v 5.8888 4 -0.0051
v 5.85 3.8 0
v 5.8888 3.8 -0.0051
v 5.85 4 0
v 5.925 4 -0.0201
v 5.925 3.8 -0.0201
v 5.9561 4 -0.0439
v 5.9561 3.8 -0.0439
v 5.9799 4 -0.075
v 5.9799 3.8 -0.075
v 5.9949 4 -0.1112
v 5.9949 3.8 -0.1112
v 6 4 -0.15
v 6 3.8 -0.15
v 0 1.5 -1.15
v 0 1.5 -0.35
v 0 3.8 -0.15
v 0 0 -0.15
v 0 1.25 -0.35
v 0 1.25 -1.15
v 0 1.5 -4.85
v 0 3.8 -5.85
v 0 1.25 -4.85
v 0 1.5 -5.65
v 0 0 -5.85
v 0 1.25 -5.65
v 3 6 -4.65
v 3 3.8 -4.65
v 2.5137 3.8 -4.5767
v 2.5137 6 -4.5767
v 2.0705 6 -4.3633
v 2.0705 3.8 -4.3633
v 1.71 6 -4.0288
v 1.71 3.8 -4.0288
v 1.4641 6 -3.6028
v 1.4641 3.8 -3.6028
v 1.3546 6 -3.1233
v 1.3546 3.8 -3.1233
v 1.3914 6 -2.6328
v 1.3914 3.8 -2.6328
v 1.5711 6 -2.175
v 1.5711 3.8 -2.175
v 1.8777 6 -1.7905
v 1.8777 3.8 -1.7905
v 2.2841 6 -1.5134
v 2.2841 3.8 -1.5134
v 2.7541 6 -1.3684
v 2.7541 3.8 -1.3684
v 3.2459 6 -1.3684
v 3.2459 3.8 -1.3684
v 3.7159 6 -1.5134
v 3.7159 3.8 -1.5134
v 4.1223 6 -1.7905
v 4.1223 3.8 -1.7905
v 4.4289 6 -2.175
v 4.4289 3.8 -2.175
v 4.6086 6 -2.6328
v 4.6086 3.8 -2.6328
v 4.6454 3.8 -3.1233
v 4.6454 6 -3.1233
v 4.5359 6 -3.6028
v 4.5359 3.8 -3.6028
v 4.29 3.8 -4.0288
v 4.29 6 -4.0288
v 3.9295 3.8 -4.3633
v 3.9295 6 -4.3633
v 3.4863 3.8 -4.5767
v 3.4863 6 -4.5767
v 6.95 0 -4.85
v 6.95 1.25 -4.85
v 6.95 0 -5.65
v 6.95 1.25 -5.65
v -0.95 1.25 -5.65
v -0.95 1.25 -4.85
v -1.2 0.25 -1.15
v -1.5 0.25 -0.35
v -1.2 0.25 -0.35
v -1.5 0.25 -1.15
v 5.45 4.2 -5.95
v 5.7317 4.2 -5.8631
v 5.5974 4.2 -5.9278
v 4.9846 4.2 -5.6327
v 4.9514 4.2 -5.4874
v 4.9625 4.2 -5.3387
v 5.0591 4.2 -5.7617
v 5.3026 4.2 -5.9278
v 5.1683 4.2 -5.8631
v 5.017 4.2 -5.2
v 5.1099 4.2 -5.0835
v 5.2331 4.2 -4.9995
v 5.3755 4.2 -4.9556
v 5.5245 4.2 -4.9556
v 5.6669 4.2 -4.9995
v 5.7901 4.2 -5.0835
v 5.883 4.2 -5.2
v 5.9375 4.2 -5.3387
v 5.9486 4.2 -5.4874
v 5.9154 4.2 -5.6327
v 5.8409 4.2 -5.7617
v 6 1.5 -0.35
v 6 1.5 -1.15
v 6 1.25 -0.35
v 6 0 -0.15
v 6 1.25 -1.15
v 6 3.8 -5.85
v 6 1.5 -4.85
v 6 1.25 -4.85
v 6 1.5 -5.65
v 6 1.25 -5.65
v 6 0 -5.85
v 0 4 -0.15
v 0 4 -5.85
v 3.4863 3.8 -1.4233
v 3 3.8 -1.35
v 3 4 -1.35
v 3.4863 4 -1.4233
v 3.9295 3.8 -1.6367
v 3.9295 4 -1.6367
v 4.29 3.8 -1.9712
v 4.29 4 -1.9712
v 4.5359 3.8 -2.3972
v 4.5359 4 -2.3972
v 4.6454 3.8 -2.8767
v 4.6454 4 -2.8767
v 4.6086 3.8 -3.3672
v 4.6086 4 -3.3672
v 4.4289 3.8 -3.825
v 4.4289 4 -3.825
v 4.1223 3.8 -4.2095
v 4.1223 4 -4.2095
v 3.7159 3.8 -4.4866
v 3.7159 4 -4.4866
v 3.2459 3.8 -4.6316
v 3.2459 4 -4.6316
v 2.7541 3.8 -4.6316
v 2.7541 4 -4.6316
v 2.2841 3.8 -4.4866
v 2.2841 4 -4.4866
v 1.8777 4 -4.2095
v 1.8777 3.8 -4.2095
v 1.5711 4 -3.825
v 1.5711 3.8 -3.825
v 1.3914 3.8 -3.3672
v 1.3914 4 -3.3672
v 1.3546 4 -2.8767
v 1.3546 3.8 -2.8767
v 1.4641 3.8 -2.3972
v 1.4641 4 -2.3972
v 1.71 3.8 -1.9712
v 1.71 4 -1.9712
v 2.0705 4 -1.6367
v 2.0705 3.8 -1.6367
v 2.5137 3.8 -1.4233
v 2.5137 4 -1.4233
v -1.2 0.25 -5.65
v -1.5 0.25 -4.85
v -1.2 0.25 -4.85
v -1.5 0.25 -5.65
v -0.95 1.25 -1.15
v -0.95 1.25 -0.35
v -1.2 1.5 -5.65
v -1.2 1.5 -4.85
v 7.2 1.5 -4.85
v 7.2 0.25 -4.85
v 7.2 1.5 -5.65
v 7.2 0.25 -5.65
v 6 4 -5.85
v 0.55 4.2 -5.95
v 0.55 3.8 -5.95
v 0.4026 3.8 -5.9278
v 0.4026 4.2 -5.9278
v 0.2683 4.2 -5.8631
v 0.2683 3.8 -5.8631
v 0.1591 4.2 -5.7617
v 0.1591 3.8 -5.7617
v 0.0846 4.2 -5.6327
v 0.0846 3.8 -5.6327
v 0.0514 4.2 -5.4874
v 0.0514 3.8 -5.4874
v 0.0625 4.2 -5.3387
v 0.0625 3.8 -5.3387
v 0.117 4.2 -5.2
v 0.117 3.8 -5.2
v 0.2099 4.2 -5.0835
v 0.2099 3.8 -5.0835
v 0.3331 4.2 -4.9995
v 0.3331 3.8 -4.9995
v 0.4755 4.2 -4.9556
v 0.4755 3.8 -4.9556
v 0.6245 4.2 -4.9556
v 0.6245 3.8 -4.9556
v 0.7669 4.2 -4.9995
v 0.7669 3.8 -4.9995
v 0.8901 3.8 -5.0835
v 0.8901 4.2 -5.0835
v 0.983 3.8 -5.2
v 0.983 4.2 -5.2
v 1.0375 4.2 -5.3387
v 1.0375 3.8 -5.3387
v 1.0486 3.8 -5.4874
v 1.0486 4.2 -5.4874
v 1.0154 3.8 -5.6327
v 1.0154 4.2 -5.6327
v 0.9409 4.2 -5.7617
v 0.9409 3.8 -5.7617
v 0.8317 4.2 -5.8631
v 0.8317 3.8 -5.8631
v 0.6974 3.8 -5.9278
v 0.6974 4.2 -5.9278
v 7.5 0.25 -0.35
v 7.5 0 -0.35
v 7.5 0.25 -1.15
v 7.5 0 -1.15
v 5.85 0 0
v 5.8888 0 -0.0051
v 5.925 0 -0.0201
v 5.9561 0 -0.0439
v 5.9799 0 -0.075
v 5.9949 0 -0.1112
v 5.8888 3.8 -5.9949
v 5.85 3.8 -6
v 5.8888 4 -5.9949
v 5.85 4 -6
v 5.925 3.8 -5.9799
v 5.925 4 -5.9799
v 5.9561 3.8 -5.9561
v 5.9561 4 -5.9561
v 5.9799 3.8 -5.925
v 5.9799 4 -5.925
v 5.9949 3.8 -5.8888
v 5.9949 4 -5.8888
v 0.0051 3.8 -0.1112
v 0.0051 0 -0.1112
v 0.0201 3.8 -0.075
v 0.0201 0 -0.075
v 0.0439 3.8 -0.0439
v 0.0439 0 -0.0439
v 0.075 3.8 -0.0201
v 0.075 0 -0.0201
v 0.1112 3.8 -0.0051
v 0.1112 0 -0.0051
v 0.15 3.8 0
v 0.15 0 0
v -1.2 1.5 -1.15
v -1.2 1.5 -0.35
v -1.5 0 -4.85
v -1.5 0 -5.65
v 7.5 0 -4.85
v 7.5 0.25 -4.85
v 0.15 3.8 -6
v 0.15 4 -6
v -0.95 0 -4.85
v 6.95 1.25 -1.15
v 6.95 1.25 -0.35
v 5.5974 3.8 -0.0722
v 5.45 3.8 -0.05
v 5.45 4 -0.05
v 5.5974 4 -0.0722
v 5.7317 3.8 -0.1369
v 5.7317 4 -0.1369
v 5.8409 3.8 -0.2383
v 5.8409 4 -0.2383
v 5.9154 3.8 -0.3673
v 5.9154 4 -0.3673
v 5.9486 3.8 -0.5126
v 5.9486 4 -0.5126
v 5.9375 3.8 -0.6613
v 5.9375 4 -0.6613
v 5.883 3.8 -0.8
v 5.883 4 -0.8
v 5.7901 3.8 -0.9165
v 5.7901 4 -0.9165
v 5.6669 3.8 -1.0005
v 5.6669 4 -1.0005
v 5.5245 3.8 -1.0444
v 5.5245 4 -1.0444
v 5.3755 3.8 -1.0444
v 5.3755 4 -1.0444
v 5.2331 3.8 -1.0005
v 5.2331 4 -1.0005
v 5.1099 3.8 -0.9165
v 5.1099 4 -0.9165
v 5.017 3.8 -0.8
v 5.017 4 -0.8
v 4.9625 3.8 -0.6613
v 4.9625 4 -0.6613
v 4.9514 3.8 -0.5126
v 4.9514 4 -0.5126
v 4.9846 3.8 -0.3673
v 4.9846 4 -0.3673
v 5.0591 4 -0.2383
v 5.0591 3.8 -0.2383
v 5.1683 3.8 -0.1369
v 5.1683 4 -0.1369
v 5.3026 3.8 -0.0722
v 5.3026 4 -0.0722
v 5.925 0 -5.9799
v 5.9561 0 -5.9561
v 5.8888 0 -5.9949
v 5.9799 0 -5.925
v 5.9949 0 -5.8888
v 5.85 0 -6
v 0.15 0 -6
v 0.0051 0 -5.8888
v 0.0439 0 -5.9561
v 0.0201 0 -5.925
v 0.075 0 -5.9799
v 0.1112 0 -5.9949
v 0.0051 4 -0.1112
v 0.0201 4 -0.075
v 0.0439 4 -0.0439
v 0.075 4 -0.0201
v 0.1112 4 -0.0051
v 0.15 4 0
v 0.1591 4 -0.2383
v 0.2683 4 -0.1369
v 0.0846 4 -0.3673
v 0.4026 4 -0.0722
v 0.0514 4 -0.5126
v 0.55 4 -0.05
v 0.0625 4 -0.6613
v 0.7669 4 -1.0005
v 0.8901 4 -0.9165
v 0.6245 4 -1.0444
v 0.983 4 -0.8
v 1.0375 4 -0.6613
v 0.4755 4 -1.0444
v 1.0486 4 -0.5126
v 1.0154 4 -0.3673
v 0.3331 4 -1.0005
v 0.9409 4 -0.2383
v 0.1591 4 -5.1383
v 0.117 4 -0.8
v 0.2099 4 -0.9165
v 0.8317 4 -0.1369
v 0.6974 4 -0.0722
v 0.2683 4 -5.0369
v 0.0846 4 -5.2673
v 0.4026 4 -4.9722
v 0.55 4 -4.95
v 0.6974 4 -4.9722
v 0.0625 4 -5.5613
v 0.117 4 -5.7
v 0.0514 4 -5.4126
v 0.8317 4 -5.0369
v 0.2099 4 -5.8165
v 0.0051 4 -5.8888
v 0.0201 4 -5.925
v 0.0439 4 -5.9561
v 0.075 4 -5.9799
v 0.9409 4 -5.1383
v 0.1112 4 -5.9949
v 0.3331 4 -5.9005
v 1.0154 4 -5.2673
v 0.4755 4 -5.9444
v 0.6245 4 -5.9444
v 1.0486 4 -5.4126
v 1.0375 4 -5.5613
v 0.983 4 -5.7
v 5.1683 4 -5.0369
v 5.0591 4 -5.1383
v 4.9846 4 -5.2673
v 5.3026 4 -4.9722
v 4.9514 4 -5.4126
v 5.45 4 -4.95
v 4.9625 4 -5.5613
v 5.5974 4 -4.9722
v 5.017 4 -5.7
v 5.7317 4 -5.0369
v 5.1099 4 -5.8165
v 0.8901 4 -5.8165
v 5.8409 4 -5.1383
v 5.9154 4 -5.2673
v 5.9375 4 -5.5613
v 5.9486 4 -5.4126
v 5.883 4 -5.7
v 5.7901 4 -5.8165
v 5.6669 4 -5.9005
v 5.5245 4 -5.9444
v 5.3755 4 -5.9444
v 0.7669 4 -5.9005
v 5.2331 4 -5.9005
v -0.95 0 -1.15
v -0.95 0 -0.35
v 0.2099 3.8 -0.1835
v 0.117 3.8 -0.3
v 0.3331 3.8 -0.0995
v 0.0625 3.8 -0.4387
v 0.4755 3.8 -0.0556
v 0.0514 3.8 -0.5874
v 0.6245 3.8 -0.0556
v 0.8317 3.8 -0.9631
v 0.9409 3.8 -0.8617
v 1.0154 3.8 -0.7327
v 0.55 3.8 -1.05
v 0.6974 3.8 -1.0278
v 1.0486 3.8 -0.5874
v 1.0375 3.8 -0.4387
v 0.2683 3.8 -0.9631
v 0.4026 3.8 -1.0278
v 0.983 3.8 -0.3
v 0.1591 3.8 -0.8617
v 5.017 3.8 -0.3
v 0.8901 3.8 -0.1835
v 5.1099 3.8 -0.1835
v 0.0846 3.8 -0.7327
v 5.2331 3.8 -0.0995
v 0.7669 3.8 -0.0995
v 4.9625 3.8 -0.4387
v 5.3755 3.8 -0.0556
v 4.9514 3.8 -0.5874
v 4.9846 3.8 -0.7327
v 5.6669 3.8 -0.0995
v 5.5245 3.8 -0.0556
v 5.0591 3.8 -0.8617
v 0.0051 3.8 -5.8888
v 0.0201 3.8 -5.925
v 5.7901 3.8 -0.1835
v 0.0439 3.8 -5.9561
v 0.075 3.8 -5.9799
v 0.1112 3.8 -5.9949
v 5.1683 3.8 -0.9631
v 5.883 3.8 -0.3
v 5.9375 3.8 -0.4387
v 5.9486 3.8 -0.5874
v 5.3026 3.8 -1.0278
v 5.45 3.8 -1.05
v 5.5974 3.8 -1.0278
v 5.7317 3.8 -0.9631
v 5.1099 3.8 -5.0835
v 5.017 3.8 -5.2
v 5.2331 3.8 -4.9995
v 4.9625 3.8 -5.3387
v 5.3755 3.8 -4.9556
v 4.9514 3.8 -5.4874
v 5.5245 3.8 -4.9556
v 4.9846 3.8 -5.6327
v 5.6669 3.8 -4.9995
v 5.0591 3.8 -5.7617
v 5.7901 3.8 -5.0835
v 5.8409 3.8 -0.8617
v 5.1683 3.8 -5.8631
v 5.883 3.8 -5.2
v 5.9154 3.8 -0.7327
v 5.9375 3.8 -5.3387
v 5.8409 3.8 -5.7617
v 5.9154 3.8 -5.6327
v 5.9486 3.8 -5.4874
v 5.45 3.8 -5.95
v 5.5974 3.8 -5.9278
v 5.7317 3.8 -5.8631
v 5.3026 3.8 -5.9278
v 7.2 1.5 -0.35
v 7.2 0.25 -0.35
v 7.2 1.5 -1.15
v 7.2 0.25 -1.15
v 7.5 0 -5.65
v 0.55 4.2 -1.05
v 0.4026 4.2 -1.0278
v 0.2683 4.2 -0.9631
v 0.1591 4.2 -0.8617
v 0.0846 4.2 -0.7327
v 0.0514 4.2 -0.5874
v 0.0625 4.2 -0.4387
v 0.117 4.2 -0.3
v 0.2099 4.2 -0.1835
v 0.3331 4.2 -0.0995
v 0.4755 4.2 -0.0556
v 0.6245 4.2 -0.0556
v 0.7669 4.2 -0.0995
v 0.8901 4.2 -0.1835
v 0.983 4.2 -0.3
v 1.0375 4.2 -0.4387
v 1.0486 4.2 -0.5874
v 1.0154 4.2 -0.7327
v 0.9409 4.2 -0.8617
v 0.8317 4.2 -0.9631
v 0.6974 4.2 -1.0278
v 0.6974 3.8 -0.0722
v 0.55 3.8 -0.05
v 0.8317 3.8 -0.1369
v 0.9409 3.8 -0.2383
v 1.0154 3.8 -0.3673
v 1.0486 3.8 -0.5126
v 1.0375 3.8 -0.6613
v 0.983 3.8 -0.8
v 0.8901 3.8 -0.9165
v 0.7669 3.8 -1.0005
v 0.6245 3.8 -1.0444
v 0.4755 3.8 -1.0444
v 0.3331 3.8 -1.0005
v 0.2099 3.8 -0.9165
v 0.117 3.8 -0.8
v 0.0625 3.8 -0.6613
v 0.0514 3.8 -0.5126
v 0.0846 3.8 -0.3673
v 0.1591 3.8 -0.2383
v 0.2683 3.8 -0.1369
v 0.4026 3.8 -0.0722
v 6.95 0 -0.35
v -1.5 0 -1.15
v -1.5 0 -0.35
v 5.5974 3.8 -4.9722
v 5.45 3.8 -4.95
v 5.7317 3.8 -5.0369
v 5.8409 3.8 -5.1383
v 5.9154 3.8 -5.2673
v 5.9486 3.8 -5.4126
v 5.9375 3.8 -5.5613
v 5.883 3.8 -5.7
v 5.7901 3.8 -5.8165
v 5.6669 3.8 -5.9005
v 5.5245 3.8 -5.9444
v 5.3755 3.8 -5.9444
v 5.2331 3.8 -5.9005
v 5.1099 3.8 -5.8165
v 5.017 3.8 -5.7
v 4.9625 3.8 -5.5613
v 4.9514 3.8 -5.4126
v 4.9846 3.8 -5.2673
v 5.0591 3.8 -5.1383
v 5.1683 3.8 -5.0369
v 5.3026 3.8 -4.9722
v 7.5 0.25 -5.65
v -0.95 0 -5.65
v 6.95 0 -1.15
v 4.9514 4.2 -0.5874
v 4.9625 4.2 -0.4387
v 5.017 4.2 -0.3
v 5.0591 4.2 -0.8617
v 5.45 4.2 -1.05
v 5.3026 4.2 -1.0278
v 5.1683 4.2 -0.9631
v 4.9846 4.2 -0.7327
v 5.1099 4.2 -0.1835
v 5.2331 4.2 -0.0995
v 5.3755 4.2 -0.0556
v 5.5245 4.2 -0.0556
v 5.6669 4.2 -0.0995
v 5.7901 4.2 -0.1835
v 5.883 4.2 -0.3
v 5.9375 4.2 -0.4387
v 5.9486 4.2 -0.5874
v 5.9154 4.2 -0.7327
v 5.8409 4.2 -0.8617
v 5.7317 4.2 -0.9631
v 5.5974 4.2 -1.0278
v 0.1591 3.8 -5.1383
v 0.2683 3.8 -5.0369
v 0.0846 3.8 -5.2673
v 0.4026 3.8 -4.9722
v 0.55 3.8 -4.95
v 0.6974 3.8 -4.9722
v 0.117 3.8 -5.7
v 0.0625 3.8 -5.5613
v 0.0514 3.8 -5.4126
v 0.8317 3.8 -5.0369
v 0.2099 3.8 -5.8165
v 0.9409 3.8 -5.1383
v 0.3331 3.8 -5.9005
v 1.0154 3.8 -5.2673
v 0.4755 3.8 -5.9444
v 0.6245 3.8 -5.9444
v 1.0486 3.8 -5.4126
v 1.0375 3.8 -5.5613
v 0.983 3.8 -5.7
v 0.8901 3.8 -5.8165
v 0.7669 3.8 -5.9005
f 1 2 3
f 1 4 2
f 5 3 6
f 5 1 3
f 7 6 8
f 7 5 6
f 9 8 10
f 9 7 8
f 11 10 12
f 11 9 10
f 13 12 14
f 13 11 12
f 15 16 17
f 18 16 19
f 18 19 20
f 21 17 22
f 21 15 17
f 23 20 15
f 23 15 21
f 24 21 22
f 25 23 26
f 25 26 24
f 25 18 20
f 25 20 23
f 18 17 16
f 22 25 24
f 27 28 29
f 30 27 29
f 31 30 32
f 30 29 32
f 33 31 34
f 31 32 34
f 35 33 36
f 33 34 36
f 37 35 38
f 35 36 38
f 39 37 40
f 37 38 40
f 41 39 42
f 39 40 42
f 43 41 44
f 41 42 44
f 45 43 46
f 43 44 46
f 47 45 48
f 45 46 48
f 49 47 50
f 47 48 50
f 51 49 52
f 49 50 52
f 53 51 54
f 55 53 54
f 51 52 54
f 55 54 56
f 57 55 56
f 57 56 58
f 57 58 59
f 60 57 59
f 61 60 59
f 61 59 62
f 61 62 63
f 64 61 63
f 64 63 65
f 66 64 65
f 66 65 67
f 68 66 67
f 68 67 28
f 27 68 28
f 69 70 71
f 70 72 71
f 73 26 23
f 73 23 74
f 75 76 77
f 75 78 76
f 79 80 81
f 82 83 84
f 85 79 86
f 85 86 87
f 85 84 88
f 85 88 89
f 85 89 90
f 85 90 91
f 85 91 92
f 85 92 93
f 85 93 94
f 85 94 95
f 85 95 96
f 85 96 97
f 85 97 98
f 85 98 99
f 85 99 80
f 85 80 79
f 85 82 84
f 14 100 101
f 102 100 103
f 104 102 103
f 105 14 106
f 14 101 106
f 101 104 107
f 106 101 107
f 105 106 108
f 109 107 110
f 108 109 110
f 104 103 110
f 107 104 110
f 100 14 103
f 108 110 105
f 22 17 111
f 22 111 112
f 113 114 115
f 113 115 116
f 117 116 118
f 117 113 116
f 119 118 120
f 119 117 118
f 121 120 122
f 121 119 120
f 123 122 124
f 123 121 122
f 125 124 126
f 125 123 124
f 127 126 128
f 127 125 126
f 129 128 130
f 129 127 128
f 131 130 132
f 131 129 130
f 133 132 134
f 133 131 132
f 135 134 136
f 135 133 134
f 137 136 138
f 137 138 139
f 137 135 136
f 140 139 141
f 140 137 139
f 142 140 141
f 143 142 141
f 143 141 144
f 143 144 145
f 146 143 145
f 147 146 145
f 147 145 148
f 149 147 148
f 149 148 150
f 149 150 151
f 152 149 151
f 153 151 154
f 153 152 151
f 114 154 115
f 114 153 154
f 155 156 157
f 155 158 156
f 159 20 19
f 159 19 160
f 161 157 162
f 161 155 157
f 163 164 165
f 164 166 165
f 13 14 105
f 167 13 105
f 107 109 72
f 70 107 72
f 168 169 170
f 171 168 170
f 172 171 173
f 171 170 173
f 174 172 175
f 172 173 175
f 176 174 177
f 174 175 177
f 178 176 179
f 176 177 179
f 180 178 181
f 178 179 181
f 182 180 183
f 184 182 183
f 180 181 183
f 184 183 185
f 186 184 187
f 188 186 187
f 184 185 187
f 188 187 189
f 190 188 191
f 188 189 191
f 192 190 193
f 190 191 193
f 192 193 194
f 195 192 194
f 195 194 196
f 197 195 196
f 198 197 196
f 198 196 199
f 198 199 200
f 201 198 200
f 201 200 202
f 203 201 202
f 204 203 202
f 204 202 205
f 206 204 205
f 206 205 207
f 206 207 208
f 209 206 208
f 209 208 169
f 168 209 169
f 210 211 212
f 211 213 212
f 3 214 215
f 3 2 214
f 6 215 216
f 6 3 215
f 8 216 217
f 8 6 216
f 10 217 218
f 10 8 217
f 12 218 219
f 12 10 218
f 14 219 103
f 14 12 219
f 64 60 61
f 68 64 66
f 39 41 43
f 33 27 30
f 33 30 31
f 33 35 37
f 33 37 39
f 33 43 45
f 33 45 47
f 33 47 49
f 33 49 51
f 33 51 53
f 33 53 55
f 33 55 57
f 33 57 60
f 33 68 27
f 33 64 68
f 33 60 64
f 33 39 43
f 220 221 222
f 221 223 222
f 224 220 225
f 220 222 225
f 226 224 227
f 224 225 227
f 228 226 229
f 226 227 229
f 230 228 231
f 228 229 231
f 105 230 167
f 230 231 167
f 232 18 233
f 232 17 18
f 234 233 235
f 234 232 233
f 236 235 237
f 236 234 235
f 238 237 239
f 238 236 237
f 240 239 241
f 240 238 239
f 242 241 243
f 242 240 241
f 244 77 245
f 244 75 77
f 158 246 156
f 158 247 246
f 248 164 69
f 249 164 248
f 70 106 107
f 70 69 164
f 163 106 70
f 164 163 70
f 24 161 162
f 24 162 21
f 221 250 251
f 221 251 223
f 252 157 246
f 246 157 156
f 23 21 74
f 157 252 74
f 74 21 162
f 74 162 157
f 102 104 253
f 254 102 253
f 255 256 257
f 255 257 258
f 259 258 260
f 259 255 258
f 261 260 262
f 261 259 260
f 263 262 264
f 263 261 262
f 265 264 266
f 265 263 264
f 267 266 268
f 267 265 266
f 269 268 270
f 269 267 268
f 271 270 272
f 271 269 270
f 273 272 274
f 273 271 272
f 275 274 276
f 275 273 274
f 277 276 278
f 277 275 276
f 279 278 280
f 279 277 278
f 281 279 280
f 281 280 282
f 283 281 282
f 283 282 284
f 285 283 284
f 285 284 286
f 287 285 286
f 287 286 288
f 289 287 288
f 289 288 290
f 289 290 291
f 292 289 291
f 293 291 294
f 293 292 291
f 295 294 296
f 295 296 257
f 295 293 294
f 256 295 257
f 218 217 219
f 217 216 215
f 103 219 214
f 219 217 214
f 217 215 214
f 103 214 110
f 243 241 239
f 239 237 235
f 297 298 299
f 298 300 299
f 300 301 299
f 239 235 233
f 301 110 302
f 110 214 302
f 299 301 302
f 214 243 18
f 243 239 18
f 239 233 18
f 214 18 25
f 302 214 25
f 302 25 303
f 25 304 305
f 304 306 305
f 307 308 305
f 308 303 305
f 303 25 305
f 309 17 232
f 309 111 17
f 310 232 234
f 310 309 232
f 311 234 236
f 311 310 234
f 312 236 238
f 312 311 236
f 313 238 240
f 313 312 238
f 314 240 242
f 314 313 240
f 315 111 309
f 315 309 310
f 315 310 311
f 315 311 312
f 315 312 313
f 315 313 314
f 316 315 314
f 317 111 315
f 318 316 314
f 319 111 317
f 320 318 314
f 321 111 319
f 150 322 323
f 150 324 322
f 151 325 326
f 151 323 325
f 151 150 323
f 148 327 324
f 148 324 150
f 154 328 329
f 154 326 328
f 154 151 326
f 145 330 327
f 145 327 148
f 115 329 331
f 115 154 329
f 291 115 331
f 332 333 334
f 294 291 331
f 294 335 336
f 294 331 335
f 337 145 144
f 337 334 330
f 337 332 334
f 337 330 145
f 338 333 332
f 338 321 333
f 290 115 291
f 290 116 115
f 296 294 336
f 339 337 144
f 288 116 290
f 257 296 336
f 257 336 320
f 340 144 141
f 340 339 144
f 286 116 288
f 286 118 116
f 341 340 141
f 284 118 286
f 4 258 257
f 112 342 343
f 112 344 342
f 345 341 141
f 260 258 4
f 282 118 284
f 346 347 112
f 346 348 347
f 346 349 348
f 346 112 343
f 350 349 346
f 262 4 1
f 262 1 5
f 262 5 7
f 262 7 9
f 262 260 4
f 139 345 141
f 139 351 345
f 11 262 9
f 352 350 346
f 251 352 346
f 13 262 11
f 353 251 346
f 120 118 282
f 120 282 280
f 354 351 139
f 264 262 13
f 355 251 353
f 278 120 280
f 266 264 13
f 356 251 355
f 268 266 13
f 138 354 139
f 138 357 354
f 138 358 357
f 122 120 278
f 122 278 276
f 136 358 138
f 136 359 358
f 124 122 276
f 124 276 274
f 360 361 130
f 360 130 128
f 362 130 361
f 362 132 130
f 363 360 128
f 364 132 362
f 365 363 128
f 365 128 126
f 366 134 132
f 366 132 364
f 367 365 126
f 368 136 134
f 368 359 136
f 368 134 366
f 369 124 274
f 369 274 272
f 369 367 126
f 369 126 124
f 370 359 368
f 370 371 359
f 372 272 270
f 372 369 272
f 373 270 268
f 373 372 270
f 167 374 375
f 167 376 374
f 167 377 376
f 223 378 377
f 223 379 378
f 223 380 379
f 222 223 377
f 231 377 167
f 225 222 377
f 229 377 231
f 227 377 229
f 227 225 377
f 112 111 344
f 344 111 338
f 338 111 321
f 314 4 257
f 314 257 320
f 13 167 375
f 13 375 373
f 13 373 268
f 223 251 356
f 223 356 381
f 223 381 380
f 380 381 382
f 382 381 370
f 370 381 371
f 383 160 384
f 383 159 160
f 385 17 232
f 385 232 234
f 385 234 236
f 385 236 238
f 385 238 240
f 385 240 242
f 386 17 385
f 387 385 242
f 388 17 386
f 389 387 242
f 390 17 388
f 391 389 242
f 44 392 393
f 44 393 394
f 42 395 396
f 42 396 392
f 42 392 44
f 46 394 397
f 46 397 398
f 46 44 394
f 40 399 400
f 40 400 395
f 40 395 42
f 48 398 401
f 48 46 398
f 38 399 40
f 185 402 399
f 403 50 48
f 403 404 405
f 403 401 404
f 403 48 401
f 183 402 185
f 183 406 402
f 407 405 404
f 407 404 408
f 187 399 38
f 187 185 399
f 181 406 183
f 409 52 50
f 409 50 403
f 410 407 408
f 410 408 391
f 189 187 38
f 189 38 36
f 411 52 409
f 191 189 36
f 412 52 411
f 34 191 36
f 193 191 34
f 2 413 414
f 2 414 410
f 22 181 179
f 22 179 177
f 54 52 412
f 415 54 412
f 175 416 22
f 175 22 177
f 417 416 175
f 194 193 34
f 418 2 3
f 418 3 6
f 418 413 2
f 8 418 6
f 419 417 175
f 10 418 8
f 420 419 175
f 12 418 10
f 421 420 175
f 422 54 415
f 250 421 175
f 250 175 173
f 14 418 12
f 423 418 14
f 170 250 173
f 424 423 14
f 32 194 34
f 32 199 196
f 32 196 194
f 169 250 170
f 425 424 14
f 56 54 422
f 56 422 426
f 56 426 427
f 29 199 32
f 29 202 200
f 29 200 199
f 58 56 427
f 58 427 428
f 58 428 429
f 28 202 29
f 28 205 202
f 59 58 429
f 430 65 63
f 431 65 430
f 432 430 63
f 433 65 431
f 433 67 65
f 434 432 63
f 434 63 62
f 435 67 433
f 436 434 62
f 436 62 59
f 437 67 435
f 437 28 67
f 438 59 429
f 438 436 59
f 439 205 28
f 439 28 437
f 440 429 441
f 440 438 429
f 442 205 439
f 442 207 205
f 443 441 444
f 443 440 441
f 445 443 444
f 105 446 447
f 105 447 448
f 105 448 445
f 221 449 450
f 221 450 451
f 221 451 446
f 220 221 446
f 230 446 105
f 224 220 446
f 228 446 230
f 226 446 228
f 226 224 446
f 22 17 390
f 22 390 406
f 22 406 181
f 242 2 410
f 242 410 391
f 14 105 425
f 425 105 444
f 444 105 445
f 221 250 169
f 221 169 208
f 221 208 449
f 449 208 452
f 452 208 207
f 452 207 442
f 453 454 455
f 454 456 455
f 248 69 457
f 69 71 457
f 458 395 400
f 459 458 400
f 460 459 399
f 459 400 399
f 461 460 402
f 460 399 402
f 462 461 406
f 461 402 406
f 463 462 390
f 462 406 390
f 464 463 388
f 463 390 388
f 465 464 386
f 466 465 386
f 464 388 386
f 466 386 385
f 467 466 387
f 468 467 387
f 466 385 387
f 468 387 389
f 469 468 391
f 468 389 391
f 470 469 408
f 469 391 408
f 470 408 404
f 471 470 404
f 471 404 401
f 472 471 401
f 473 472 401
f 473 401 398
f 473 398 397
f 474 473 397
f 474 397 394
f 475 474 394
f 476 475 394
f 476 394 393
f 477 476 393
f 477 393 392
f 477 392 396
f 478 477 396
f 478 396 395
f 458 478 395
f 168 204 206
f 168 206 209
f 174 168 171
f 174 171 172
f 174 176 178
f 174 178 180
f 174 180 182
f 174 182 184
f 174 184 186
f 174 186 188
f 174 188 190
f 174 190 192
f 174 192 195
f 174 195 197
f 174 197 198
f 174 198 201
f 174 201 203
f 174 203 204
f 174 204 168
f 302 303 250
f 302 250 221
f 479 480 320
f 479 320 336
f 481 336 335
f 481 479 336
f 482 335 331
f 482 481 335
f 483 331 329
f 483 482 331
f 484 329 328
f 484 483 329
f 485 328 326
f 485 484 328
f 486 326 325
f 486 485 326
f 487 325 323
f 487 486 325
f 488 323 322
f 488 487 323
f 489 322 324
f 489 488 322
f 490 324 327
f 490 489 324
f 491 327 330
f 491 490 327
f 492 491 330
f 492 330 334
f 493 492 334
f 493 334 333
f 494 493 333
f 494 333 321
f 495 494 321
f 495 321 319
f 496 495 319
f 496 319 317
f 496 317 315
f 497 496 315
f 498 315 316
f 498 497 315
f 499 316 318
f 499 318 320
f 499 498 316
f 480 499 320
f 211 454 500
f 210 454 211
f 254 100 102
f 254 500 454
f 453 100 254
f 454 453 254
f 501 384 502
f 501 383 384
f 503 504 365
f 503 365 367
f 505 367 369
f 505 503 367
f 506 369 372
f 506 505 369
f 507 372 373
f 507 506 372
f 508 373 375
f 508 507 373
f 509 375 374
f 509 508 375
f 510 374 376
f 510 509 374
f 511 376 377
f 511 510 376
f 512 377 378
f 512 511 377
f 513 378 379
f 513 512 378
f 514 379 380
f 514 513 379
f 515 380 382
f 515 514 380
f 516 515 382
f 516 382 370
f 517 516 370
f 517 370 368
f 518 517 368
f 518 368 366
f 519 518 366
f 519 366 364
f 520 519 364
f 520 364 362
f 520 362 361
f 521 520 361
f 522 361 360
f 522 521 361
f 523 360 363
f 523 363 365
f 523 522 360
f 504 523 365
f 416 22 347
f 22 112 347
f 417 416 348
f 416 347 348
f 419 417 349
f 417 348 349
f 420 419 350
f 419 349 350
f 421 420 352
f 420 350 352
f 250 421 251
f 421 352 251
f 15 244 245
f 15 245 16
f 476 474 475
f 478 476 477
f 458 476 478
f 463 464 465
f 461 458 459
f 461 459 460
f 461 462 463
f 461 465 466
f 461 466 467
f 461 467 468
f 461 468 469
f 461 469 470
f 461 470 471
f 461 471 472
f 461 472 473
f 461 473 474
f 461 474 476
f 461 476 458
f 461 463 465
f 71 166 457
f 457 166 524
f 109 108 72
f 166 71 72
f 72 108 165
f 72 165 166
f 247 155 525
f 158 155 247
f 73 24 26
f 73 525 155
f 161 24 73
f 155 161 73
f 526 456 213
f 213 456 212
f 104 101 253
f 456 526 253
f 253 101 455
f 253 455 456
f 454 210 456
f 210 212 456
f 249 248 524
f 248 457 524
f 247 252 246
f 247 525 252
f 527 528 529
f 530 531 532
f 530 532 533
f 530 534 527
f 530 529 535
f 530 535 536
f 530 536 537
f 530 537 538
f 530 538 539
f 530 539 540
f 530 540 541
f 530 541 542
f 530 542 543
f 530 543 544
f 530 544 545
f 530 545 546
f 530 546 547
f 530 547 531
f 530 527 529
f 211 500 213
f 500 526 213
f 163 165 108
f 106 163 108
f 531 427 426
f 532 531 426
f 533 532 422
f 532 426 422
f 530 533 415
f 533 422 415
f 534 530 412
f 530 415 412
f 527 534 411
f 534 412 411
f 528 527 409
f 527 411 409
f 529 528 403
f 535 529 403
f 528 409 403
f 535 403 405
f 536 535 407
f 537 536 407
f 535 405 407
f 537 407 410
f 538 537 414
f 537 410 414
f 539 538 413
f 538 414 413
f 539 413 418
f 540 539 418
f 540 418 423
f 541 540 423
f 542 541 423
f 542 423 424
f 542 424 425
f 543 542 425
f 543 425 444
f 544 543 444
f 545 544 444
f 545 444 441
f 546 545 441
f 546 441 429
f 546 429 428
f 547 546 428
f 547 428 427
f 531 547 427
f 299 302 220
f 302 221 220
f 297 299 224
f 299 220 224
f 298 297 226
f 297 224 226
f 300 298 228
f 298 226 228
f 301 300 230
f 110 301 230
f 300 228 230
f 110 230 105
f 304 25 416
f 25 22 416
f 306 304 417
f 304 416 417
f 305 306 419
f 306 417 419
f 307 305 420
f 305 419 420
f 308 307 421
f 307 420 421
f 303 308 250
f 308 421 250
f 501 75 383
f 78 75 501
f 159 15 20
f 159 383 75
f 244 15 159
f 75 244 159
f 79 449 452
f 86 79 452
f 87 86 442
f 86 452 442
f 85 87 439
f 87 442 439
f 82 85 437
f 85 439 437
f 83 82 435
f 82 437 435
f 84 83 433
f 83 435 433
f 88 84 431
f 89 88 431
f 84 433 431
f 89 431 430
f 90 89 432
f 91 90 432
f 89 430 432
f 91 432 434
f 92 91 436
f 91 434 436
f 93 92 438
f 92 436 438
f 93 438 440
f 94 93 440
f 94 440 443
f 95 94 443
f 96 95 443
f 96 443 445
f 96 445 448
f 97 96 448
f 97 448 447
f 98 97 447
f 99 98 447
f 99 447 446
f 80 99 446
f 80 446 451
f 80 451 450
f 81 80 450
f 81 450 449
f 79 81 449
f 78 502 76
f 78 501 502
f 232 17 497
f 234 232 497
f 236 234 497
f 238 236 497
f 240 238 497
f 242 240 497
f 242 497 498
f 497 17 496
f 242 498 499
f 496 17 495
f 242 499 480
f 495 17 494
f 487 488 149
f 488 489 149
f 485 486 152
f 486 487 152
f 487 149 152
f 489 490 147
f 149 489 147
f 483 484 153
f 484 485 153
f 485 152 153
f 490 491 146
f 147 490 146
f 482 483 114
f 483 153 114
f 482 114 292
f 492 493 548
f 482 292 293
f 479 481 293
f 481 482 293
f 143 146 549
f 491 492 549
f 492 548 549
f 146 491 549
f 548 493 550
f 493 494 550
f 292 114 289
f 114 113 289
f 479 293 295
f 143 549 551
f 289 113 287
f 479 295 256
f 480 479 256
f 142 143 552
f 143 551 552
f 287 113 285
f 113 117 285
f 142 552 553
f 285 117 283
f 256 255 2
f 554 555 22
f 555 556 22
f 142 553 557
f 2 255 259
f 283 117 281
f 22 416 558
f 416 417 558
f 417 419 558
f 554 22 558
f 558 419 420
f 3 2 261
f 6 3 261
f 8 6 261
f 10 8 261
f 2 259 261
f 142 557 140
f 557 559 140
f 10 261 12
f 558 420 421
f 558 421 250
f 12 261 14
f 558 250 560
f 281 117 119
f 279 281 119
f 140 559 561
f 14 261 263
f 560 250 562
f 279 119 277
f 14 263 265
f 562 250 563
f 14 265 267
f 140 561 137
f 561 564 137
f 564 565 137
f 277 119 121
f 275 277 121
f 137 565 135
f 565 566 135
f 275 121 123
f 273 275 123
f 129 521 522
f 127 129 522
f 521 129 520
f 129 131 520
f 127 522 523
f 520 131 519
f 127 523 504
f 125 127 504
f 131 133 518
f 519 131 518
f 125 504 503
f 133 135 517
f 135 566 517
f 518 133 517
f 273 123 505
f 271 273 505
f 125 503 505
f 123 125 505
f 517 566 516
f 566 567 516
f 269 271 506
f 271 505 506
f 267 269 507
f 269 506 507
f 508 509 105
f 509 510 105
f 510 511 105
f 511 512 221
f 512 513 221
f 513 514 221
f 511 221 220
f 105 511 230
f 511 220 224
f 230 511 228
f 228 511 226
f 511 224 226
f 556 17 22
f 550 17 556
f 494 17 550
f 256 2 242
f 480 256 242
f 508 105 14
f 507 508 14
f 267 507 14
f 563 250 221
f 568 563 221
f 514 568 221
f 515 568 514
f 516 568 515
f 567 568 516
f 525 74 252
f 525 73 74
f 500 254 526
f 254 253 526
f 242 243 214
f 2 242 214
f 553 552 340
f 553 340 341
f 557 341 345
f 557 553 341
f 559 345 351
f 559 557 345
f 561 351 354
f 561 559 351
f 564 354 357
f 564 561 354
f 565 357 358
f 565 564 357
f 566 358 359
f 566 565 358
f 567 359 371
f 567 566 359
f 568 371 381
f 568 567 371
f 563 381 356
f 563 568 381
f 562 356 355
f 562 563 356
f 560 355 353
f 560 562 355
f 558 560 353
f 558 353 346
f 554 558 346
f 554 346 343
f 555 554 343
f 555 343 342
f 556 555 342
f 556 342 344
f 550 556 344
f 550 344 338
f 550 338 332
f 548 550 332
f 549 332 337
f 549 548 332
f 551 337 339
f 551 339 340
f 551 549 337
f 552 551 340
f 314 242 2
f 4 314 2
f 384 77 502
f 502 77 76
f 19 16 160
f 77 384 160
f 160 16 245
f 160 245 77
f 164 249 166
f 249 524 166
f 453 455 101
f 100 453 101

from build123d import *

# Parameters (mm, degrees)
SKETCH1_W           = 6
SKETCH1_H           = 6
BOSS_EXTRUDE1_DEPTH = 3.8
SKETCH1_3_R         = 1.65
BOSS_EXTRUDE2_DEPTH = 6
SKETCH1_4_R         = 0.5
BOSS_EXTRUDE3_DEPTH = 4.2
SKETCH2_W           = 6
SKETCH2_H           = 6
SKETCH2_R           = 1.65
SKETCH2_R_2         = 0.5
BOSS_EXTRUDE4_DEPTH = 0.2
FILLET1_R           = 0.15
FILLET2_R           = 0.15
BOSS_EXTRUDE5_START = -0.75
BOSS_EXTRUDE5_DEPTH = 0.4
BOSS_EXTRUDE6_START = -5.25
BOSS_EXTRUDE6_DEPTH = 0.4


with BuildPart() as part:
    # Sketch1 → Boss-Extrude1 (new body)
    with BuildSketch(Plane(origin=(0, 0, 0), x_dir=(1, 0, 0), z_dir=(0, 1, 0))):
        with Locations((3, 3)):
            Rectangle(SKETCH1_W, SKETCH1_H)
    extrude(amount=BOSS_EXTRUDE1_DEPTH)

    # Sketch1<3> → Boss-Extrude2 (add)
    with BuildSketch(Plane(origin=(0, 0, 0), x_dir=(1, 0, 0), z_dir=(0, 1, 0))):
        with Locations((3, 3)):
            Circle(SKETCH1_3_R)
    extrude(amount=BOSS_EXTRUDE2_DEPTH)

    # Sketch1<4> → Boss-Extrude3 (add)
    with BuildSketch(Plane(origin=(0, 0, 0), x_dir=(1, 0, 0), z_dir=(0, 1, 0))):
        with Locations((0.55, 5.45)):
            Circle(SKETCH1_4_R)
        with Locations((5.45, 5.45)):
            Circle(SKETCH1_4_R)
        with Locations((5.45, 0.55)):
            Circle(SKETCH1_4_R)
        with Locations((0.55, 0.55)):
            Circle(SKETCH1_4_R)
    extrude(amount=BOSS_EXTRUDE3_DEPTH)

    # Fillet1
    fillet1_edges = [part.edges().sort_by_distance(p)[0] for p in [
        (0, 1.9, 0),
        (0, 1.9, -6),
        (6, 1.9, -6),
        (6, 1.9, 0),
    ]]
    fillet(fillet1_edges, radius=FILLET1_R)

    # Sketch3 → Boss-Extrude5 (add, symmetric)
    with BuildSketch(Plane(origin=(0, 0, -6), x_dir=(-1, 0, 0), z_dir=(0, 0, -1)).offset(BOSS_EXTRUDE5_START)):
        Polygon((-6, 1.25), (-6.95, 1.25), (-6.95, 0), (-7.5, 0), (-7.5, 0.25), (-7.2, 0.25), (-7.2, 1.5), (-6, 1.5), align=None)
    boss_extrude5 = extrude(amount=BOSS_EXTRUDE5_DEPTH, both=True)

    # Sketch3<2> → Boss-Extrude6 (add, symmetric)
    with BuildSketch(Plane(origin=(0, 0, -6), x_dir=(-1, 0, 0), z_dir=(0, 0, -1)).offset(BOSS_EXTRUDE6_START)):
        Polygon((-6, 1.25), (-6.95, 1.25), (-6.95, 0), (-7.5, 0), (-7.5, 0.25), (-7.2, 0.25), (-7.2, 1.5), (-6, 1.5), align=None)
    boss_extrude6 = extrude(amount=BOSS_EXTRUDE6_DEPTH, both=True)

    # Mirror1: Boss-Extrude5, Boss-Extrude6 across plane
    add(boss_extrude5.mirror(Plane(origin=(3, 0, 0), x_dir=(0, 0, 1), z_dir=(1, 0, 0))))
    add(boss_extrude6.mirror(Plane(origin=(3, 0, 0), x_dir=(0, 0, 1), z_dir=(1, 0, 0))))


with BuildPart() as body_2:
    # Sketch2 → Boss-Extrude4 (new body)
    with BuildSketch(Plane(origin=(0, 3.8, 0), x_dir=(1, 0, 0), z_dir=(0, 1, 0))):
        with Locations((3, 3)):
            Rectangle(SKETCH2_W, SKETCH2_H)
        with Locations((3, 3)):
            Circle(SKETCH2_R, mode=Mode.SUBTRACT)
        with Locations((5.45, 0.55)):
            Circle(SKETCH2_R_2, mode=Mode.SUBTRACT)
        with Locations((0.55, 0.55)):
            Circle(SKETCH2_R_2, mode=Mode.SUBTRACT)
        with Locations((0.55, 5.45)):
            Circle(SKETCH2_R_2, mode=Mode.SUBTRACT)
        with Locations((5.45, 5.45)):
            Circle(SKETCH2_R_2, mode=Mode.SUBTRACT)
    extrude(amount=BOSS_EXTRUDE4_DEPTH)

    # Fillet2
    fillet2_edges = [body_2.edges().sort_by_distance(p)[0] for p in [
        (6, 3.9, -6),
        (6, 3.9, 0),
        (0, 3.9, 0),
        (0, 3.9, -6),
    ]]
    fillet(fillet2_edges, radius=FILLET2_R)


solid = Compound([part.part, body_2.part])
